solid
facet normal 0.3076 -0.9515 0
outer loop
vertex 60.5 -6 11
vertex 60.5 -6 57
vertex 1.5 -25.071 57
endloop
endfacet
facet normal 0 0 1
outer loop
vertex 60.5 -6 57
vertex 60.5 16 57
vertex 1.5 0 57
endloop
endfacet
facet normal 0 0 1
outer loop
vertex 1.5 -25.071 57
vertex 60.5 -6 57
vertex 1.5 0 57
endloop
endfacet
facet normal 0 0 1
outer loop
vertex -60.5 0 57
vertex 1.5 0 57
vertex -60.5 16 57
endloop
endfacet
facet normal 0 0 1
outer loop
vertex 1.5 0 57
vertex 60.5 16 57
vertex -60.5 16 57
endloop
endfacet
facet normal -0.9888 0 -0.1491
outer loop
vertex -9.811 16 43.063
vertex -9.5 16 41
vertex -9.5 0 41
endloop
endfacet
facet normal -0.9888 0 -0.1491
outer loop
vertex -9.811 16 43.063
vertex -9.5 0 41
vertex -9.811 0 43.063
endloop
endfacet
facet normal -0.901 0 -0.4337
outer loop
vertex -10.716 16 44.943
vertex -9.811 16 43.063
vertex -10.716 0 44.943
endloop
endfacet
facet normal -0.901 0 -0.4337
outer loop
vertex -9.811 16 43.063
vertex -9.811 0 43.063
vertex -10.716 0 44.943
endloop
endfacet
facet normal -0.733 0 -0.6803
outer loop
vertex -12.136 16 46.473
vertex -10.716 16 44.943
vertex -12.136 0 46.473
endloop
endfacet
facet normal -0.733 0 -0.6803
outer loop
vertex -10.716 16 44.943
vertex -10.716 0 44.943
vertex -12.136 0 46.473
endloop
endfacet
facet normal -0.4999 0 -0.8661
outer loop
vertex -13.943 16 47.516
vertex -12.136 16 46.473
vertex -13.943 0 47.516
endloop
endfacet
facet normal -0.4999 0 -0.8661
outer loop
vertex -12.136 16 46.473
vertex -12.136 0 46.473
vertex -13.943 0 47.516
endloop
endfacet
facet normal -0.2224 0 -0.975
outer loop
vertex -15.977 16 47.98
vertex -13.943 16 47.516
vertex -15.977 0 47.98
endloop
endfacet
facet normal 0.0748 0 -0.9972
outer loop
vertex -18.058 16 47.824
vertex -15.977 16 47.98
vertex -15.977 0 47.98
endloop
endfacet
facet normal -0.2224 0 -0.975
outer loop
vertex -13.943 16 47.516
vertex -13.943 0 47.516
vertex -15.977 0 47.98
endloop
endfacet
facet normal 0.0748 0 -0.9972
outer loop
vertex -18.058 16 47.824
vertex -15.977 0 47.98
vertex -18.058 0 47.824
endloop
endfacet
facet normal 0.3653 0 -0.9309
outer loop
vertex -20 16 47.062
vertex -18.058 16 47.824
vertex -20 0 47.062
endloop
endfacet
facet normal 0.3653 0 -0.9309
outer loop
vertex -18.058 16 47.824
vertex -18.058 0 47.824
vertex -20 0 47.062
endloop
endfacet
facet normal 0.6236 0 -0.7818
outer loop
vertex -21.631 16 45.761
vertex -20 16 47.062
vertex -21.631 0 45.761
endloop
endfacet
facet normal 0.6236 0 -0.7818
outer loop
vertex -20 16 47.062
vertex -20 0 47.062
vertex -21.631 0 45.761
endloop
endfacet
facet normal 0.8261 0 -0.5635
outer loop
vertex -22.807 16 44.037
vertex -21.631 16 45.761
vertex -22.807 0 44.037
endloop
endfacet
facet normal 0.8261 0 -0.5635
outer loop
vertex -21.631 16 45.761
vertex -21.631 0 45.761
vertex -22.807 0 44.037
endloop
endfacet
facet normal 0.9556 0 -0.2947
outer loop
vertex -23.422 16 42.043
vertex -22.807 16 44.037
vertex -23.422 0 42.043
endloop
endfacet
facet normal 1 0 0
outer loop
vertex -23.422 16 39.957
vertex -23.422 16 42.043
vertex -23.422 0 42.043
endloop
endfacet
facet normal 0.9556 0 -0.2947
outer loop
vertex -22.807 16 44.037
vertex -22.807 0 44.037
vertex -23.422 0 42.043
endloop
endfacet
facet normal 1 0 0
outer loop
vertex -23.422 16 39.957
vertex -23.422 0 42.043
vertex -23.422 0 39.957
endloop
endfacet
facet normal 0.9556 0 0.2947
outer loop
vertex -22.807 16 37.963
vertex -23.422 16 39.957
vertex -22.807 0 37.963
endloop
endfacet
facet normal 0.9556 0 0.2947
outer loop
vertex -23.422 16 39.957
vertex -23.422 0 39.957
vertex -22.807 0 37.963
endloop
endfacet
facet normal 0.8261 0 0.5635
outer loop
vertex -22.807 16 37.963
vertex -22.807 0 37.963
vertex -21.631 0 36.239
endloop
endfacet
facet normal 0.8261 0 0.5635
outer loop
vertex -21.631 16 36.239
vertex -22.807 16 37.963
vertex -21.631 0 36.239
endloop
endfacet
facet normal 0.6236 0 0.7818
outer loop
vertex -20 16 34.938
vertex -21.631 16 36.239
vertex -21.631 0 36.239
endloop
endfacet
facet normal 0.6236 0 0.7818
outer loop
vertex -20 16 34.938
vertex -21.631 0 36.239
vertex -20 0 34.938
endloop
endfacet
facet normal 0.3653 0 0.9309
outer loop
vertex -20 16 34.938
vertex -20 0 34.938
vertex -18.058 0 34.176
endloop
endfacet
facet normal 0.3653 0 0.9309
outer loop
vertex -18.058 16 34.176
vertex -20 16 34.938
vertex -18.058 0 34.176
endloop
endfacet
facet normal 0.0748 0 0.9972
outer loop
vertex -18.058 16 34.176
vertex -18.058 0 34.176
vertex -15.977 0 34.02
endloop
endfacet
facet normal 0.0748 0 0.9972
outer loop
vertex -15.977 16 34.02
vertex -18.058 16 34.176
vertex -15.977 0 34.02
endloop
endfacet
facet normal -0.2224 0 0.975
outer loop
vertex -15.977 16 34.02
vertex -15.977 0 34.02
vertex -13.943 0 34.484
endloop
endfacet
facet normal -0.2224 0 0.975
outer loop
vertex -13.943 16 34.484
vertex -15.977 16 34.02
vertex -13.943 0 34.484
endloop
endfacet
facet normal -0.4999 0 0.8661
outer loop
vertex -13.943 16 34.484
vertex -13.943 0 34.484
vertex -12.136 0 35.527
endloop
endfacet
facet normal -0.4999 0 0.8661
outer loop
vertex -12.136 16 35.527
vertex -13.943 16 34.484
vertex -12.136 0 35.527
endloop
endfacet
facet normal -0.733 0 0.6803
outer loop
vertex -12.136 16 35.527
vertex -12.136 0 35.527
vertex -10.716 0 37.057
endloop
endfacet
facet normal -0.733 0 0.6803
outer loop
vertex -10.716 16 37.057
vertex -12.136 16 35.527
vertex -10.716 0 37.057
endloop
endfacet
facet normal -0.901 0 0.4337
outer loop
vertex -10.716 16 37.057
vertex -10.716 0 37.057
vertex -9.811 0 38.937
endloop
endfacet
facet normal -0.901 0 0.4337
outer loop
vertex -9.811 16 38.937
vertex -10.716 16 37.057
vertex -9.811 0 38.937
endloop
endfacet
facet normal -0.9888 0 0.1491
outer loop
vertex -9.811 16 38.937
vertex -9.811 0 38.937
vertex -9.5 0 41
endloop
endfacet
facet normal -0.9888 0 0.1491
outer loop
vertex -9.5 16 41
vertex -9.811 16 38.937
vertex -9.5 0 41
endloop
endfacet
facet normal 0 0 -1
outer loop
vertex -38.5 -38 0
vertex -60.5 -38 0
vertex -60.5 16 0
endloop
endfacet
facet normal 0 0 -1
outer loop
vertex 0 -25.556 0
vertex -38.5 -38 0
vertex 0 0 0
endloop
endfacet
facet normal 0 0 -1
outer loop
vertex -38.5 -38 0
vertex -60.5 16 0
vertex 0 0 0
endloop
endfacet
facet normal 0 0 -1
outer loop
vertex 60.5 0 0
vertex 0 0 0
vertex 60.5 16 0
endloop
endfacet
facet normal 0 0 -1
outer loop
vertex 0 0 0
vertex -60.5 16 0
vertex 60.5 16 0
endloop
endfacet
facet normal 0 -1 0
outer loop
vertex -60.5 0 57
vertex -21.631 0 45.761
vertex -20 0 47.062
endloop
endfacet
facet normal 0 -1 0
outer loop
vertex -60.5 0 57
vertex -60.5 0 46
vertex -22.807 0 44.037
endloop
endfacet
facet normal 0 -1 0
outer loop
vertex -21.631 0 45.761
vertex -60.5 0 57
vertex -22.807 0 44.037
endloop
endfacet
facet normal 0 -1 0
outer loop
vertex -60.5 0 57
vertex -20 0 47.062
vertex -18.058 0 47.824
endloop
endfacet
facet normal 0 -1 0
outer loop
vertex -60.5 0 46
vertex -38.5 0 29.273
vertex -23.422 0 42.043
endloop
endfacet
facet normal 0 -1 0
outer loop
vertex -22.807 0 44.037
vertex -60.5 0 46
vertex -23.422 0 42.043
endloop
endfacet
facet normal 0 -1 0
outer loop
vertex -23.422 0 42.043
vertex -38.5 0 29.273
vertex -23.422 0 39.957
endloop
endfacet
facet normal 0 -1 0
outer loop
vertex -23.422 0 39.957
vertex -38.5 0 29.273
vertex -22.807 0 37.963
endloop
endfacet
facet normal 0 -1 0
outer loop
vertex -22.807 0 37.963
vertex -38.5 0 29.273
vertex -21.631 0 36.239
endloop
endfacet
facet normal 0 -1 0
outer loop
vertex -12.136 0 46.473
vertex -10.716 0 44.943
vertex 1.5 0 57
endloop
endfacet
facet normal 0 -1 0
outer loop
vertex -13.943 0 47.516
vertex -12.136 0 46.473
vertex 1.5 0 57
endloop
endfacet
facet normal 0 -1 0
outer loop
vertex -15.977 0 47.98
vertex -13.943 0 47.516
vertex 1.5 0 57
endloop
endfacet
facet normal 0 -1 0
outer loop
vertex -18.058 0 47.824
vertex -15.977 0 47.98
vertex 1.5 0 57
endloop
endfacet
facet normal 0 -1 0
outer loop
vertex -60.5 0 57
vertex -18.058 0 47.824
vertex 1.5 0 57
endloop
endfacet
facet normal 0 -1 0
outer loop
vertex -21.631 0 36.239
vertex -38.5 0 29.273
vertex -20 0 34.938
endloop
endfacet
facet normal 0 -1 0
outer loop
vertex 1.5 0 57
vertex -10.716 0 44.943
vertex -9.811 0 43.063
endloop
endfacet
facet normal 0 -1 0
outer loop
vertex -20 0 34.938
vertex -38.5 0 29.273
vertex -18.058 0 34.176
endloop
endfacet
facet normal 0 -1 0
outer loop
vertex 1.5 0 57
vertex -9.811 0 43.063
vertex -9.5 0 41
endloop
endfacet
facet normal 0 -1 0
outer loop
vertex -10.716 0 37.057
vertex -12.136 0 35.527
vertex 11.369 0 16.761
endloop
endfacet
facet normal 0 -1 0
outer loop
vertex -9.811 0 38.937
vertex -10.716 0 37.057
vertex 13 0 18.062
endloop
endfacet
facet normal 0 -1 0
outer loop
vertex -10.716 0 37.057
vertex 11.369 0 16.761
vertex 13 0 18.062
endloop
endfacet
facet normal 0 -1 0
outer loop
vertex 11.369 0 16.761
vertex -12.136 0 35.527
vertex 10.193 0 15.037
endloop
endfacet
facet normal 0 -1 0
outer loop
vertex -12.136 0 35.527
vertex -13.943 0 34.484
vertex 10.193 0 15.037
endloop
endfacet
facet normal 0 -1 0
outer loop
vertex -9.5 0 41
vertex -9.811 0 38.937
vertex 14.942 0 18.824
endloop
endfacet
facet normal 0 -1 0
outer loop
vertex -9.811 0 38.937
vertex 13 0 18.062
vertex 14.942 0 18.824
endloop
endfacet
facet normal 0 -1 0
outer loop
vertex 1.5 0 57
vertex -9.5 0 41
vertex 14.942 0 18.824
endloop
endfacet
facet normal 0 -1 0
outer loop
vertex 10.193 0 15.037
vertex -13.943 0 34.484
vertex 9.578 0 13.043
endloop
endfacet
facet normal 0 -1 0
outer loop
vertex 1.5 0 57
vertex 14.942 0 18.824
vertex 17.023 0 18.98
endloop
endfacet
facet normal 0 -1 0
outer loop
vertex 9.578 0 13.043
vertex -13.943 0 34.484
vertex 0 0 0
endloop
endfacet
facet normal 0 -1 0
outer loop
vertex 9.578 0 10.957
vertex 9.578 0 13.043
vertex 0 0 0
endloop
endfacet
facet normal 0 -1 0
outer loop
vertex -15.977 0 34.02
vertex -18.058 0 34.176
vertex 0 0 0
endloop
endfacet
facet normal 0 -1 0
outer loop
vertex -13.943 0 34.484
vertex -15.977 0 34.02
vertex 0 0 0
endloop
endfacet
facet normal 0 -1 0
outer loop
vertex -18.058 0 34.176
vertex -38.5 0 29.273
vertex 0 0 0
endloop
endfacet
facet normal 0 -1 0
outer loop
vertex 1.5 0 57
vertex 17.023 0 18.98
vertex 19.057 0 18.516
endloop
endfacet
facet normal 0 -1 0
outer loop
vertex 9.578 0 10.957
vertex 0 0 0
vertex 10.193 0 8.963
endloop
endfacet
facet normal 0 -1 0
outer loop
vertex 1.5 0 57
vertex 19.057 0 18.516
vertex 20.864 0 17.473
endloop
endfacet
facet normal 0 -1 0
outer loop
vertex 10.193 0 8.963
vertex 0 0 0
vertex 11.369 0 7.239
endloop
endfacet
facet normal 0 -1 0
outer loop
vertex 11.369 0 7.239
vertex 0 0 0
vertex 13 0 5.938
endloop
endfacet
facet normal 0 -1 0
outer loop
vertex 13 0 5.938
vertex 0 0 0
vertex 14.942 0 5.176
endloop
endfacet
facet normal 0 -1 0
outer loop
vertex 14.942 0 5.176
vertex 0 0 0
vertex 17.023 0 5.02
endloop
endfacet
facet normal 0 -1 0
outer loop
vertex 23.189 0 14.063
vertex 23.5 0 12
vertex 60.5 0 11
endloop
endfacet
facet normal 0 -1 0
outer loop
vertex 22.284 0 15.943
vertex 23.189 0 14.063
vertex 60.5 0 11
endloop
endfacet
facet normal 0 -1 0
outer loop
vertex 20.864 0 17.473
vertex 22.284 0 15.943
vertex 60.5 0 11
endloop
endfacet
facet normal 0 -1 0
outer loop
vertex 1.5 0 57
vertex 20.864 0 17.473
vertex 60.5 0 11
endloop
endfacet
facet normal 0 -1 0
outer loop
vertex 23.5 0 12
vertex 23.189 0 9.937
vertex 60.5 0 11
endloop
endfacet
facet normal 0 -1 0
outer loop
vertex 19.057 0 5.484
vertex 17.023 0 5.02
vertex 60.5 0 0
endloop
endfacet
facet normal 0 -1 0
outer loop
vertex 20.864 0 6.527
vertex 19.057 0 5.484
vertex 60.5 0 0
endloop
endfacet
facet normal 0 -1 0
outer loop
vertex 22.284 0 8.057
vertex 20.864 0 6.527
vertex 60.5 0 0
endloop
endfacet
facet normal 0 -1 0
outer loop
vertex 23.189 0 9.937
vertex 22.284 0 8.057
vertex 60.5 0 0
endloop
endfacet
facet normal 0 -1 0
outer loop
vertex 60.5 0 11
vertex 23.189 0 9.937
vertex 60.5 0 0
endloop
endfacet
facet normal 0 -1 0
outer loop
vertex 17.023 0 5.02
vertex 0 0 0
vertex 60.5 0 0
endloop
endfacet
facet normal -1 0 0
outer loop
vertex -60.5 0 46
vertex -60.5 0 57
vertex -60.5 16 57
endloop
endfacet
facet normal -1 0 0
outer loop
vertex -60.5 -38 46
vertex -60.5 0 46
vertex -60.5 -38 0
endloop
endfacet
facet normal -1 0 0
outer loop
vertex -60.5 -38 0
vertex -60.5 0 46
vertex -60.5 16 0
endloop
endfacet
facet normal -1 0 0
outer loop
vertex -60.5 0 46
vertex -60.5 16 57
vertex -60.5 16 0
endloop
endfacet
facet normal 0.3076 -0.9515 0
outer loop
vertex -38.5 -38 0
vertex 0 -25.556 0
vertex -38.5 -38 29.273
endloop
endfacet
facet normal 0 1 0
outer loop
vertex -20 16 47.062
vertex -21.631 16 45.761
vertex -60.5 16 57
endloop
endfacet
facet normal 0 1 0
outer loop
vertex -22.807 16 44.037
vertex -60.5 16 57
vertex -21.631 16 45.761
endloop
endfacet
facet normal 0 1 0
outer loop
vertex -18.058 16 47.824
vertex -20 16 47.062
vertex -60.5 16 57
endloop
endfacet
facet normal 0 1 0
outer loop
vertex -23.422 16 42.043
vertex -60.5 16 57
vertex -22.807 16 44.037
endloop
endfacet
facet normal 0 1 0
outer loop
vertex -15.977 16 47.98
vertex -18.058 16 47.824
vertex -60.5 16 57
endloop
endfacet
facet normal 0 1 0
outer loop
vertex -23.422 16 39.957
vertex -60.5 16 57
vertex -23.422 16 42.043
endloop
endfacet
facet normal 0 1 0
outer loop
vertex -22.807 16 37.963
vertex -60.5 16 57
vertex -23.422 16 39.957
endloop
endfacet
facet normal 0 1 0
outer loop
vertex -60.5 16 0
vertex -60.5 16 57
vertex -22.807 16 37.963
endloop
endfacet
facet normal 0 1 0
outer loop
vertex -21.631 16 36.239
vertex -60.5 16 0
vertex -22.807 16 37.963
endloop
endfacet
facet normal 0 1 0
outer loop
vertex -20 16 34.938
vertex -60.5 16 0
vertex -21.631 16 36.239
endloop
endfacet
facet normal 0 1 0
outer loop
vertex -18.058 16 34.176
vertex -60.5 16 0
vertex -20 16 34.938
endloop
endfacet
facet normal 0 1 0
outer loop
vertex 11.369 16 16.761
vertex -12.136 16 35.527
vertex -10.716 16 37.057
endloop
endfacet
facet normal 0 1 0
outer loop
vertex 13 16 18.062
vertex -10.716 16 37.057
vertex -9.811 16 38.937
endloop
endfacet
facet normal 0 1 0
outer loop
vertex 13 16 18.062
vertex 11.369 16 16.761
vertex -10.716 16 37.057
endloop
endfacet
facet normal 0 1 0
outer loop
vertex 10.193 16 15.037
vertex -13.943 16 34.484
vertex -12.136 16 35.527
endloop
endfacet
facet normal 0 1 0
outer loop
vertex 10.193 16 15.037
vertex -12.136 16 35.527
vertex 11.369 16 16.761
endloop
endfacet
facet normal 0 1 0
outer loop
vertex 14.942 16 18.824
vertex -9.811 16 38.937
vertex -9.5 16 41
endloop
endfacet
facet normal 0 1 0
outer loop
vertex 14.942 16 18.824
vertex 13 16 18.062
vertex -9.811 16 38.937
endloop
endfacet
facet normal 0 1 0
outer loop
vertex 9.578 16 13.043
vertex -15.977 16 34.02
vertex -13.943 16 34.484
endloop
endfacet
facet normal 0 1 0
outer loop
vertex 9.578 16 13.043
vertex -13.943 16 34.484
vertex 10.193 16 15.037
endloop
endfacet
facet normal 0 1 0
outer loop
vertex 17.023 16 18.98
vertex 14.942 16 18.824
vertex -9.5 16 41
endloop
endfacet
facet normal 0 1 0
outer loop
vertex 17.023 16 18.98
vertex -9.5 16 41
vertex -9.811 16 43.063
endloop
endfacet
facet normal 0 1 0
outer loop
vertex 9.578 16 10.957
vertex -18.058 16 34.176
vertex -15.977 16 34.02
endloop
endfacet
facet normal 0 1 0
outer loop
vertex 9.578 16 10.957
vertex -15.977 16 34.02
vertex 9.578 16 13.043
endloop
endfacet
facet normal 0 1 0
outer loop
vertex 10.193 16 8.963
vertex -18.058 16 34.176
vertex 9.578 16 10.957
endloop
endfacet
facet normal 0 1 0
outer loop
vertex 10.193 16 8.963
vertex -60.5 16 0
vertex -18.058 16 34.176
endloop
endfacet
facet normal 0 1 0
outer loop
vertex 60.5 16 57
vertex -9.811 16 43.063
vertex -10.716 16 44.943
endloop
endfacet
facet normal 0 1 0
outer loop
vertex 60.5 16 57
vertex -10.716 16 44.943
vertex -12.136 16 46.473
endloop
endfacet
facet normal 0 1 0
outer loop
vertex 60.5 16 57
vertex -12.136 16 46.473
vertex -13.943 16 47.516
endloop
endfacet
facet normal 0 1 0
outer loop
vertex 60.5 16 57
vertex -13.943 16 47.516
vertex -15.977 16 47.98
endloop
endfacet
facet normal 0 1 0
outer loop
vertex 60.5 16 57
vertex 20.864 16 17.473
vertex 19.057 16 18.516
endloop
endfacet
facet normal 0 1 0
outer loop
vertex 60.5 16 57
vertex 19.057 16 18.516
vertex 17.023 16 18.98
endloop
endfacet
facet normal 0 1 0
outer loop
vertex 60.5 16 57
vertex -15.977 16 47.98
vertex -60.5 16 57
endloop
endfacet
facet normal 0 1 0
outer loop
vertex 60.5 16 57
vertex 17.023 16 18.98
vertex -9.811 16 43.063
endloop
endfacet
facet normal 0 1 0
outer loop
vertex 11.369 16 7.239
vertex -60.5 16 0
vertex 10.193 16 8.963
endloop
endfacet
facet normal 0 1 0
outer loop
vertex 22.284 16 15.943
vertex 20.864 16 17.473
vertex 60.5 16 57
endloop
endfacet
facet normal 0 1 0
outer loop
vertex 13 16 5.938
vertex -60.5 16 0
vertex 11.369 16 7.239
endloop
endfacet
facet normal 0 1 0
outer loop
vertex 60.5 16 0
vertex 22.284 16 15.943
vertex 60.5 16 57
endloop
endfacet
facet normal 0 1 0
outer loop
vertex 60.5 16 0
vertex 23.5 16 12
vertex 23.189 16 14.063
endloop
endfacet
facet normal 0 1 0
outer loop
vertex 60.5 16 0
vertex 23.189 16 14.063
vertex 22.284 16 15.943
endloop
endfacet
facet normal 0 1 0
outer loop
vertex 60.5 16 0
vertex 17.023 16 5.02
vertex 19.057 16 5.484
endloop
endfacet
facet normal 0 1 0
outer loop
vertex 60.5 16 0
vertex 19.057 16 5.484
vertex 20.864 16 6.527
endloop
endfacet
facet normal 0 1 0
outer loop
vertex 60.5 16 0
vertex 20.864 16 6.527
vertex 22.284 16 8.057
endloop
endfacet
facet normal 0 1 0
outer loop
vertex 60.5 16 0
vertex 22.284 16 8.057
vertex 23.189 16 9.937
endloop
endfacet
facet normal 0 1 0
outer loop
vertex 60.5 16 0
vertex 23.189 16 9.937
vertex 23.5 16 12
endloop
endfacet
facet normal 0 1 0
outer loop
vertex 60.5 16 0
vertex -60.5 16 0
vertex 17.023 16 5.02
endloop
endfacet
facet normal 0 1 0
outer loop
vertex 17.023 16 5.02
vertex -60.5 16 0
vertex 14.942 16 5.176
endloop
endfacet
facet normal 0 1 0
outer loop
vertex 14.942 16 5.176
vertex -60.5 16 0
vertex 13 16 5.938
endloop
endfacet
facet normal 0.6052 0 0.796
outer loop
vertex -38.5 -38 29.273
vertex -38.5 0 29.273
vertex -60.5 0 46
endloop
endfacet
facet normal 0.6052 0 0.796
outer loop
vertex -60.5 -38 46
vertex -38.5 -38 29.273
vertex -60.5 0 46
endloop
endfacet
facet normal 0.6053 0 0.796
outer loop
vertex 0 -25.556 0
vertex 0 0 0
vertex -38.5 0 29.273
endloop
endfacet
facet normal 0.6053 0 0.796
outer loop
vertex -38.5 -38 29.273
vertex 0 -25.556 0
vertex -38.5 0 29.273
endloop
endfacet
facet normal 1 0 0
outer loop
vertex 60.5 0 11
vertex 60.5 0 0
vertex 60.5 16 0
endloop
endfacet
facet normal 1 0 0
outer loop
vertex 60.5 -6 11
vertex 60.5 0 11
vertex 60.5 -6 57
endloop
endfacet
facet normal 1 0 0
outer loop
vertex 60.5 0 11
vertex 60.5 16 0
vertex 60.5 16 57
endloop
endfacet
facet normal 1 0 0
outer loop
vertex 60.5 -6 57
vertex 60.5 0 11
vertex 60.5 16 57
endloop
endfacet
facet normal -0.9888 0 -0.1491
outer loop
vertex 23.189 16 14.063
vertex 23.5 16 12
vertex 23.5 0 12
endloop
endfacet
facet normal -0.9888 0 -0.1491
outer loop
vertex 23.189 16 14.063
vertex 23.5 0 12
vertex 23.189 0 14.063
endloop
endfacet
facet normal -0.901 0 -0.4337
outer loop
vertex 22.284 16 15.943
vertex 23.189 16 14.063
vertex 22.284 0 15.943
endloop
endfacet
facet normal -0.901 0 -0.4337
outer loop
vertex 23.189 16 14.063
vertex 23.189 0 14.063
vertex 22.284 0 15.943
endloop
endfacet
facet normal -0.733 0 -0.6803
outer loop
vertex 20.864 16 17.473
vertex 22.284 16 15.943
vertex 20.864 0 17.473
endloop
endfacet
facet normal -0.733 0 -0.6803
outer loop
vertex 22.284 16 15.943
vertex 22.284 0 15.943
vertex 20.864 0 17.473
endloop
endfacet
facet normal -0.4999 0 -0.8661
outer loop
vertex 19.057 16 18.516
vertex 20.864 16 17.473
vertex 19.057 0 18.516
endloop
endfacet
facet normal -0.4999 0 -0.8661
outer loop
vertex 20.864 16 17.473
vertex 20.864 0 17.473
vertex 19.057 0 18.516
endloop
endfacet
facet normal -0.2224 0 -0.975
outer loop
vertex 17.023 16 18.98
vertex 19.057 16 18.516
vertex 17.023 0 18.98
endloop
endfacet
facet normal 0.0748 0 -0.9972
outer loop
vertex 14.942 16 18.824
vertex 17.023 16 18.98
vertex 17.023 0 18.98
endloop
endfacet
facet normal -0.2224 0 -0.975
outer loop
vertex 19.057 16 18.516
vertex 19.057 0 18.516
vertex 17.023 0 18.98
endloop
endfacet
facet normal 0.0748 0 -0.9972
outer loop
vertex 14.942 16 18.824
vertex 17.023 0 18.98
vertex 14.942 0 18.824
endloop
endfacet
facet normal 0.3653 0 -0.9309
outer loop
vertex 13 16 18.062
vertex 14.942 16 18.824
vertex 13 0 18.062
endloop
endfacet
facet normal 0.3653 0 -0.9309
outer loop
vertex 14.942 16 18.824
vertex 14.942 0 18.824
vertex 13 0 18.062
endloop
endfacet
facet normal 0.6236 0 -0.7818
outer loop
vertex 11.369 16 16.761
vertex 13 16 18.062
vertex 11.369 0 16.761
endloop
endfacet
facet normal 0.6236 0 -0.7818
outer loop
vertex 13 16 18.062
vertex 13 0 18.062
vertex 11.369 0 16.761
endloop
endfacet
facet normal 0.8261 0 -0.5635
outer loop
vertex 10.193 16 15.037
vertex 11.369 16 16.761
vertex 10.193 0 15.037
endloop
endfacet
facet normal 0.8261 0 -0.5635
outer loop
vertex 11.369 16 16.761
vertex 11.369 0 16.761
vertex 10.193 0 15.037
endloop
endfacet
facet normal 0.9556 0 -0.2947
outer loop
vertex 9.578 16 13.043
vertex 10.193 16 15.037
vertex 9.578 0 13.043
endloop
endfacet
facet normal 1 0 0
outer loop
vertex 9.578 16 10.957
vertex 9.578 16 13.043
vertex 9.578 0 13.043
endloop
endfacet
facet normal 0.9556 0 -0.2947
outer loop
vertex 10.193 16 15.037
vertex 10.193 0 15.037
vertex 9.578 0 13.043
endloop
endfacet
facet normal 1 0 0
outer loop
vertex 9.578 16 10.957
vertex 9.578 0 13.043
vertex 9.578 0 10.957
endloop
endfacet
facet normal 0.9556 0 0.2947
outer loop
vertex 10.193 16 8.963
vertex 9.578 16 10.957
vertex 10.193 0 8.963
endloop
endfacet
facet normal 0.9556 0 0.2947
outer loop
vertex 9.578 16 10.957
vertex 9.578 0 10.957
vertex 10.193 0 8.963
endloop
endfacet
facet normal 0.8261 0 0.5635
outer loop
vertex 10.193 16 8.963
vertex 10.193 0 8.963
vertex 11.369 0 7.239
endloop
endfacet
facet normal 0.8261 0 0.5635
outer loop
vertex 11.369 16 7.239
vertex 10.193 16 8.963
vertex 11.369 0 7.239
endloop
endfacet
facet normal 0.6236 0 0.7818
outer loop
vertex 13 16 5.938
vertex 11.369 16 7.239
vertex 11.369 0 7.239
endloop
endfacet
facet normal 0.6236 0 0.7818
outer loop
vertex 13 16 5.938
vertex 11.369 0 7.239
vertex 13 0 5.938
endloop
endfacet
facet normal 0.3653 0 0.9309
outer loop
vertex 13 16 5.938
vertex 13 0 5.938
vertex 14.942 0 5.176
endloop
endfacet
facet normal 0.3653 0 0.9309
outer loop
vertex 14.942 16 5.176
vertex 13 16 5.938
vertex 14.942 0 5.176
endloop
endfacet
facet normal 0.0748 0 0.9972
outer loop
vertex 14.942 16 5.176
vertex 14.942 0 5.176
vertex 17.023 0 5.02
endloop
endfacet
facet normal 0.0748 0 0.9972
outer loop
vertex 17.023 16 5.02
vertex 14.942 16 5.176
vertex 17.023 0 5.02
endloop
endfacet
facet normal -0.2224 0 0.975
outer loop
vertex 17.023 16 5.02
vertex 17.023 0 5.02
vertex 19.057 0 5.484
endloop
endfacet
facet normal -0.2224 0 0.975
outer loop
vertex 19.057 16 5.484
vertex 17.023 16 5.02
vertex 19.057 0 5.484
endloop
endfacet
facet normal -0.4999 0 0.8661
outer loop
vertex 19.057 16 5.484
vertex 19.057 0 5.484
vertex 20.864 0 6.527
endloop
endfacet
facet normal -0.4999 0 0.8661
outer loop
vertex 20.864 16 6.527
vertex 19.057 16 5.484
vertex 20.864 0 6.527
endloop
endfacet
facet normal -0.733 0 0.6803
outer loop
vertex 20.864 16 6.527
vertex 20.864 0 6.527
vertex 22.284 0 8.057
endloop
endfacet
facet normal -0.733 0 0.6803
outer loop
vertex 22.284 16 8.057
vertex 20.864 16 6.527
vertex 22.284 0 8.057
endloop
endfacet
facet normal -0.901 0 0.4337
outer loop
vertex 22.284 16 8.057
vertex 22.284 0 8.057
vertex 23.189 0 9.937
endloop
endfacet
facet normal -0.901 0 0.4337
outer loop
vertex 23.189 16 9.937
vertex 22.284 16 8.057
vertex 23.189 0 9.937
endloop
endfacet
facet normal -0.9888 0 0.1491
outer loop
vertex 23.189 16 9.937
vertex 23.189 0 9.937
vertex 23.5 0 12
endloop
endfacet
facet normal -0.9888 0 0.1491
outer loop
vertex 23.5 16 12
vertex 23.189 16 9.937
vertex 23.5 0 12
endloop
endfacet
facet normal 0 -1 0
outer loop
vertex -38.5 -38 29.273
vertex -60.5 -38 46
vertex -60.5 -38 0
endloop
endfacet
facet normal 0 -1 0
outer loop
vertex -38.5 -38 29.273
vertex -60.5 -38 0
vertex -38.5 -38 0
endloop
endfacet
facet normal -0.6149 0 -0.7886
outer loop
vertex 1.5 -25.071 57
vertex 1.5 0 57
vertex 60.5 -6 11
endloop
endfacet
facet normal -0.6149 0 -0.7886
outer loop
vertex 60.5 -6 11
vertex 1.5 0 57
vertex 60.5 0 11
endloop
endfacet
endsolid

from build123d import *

# Parameters (mm, degrees)
F0_W     = 121
F0_H     = 16
F1_DEPTH = 57
F2_R     = 7
F3_DEPTH = 16.001
F4_DEPTH = 38
F5_DEPTH = 38
F7_DEPTH = 57.001


with BuildPart() as f1:
    # F0 (on Top) → F1 (new body)
    with BuildSketch(Plane.XY):
        with Locations((0, 8)):
            Rectangle(F0_W, F0_H)
    extrude(amount=F1_DEPTH)

    # F2 (on face) → F3 (cut, through all)
    with BuildSketch(Plane.XZ):
        with Locations((-16.5, 41)):
            Circle(F2_R)
        with Locations((16.5, 12)):
            Circle(F2_R)
    extrude(amount=-F3_DEPTH, mode=Mode.SUBTRACT)

    # F2 (on face) → F4 (join)
    with BuildSketch(Plane.XZ):
        Polygon((-60.5, 46), (-60.5, 0), (-38.5, 0), (-38.5, 29.272727), align=None)
        Polygon((-38.5, 29.272727), (-38.5, 0), (0, 0), align=None)
    extrude(amount=F4_DEPTH)

    # F2 (on face) → F5 (join)
    with BuildSketch(Plane.XZ):
        Polygon((60.5, 57), (1.5, 57), (60.5, 11), align=None)
    extrude(amount=F5_DEPTH)

    # F6 (on face) → F7 (cut, through all)
    with BuildSketch(Plane.XY.offset(57)):
        Polygon((0, -25.555556), (-38.5, -38), (0, -38), align=None)
        Polygon((60.5, -6), (1.5, -25.070707), (1.5, -38), (60.5, -38), align=None)
    extrude(amount=-F7_DEPTH, mode=Mode.SUBTRACT)


solid = f1.part
